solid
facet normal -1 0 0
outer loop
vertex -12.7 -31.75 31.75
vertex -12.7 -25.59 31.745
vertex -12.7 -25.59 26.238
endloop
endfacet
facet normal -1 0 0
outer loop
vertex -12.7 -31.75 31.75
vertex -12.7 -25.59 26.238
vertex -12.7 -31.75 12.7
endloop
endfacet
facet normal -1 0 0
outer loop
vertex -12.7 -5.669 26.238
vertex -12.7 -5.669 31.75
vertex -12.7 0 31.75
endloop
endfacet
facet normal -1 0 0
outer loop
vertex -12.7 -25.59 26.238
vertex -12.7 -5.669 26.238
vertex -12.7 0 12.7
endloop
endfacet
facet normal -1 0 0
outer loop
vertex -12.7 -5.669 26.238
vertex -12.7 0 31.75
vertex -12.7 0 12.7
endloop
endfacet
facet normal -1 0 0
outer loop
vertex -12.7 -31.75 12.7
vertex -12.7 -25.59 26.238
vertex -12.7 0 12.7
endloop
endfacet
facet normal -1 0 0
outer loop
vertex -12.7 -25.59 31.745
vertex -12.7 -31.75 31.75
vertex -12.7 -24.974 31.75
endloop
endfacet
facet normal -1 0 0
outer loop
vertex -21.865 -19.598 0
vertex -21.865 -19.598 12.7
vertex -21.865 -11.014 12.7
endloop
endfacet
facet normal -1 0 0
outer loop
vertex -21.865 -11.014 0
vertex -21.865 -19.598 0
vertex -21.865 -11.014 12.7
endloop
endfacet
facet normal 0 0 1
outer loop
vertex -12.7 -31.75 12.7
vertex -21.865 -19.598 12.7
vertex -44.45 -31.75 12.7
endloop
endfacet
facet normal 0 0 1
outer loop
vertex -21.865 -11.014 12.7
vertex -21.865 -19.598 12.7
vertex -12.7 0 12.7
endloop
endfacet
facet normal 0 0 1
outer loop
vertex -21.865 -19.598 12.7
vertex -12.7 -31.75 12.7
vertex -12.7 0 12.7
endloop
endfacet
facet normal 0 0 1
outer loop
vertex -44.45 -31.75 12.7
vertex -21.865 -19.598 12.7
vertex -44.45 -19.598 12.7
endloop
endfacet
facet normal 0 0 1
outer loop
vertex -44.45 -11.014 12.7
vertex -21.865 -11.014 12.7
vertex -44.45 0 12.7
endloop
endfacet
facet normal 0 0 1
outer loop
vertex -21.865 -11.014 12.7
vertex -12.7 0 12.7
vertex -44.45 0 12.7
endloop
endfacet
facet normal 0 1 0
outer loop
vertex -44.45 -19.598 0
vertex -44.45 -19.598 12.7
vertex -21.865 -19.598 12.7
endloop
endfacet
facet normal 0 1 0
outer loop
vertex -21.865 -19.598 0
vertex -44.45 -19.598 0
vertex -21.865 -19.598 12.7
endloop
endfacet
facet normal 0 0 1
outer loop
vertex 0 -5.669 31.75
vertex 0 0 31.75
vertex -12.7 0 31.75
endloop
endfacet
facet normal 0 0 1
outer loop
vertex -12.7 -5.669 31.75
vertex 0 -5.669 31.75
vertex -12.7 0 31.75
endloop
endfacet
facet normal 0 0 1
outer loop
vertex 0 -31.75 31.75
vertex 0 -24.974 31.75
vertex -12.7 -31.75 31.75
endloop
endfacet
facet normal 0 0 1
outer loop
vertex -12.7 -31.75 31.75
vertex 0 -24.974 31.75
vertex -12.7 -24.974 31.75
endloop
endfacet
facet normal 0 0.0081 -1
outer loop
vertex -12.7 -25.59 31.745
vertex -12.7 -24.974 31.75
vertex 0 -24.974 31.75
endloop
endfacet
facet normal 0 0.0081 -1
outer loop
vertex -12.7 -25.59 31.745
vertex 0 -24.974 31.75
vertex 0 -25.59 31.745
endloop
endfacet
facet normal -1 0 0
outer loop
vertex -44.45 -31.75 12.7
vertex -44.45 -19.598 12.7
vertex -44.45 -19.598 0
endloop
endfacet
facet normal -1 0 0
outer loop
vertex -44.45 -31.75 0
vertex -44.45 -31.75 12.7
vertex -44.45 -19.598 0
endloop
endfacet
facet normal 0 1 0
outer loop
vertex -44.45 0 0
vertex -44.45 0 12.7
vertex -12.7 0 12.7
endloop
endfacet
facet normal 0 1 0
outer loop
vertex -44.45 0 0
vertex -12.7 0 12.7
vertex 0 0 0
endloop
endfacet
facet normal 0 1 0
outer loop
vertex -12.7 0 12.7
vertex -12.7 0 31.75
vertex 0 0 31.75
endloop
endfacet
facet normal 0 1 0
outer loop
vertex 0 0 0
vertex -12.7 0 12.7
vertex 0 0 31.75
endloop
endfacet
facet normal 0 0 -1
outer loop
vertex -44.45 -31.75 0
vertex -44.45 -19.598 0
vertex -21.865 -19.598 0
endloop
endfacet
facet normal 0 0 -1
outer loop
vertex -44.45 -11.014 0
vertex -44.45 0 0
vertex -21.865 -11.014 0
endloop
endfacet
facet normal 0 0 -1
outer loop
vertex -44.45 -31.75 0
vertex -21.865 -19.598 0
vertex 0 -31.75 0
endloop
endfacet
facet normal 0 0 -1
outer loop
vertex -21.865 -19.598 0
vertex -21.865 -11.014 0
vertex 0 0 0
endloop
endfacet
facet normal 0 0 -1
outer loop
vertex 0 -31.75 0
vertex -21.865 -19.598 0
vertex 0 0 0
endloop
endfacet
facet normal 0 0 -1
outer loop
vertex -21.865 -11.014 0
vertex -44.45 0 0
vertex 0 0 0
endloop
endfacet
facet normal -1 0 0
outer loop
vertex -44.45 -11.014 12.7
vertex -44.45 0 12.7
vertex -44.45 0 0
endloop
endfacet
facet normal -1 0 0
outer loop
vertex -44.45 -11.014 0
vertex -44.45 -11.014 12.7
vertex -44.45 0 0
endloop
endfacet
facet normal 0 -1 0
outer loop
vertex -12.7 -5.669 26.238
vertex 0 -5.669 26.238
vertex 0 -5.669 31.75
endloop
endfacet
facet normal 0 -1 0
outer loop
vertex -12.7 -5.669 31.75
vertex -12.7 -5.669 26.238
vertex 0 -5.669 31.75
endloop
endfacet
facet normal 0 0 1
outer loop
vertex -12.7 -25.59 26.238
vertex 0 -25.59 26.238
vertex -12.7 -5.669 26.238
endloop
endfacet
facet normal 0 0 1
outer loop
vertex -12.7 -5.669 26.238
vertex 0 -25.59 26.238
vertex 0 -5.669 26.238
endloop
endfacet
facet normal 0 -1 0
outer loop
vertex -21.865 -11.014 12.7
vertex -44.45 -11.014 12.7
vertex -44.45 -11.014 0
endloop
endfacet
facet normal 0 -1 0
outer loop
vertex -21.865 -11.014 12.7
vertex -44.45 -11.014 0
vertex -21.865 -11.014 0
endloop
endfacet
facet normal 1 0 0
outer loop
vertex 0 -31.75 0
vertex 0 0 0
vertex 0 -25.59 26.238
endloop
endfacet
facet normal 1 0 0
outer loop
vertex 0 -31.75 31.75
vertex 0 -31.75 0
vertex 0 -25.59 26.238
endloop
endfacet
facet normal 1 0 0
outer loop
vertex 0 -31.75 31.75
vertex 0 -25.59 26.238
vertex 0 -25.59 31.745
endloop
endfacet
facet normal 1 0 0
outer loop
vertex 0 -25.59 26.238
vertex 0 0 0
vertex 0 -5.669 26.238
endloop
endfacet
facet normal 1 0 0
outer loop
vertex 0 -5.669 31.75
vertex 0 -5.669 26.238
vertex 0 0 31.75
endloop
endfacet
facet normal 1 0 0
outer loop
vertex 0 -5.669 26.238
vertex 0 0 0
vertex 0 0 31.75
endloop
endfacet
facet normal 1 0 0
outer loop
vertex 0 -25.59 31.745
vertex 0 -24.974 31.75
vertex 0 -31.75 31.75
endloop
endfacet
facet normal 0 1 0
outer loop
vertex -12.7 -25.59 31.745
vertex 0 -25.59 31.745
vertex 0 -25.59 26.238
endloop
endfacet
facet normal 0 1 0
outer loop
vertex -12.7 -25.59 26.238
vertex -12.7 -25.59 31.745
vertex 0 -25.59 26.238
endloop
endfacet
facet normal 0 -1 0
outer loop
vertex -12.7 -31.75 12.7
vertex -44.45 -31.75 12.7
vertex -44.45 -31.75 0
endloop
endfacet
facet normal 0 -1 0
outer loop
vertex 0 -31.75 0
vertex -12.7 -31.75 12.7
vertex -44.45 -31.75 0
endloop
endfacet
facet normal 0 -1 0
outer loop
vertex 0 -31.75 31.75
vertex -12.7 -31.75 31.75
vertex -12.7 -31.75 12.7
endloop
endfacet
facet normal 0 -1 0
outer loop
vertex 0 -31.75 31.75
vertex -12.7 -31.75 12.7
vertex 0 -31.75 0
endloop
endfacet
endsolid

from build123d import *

# Parameters (mm, degrees)
F1_DEPTH = 31.75
F2_W     = 22.5849208206
F2_H     = 8.5840681568
F3_DEPTH = 1320.8
F5_DEPTH = 127


with BuildPart() as f1:
    # F0 (on Front) → F1 (new body)
    with BuildSketch(Plane.XZ):
        Polygon((-44.45, 0), (0, 0), (0, 31.75), (-12.7, 31.75), (-12.7, 12.7), (-44.45, 12.7), align=None)
    extrude(amount=F1_DEPTH)

    # F2 (on face) → F3 (cut)
    with BuildSketch(Plane.XY.offset(12.7)):
        with Locations((-33.1575395897, -15.3055558912)):
            Rectangle(F2_W, F2_H)
    extrude(amount=-F3_DEPTH, mode=Mode.SUBTRACT)

    # F4 (on Right) → F5 (cut)
    with BuildSketch(Plane.YZ):
        Polygon((-5.6687253527, 31.9069586694), (-25.590242818, 31.7449867725), (-25.590242818, 26.2379515916), (-5.6687253527, 26.2379515916), align=None)
    extrude(amount=-F5_DEPTH, mode=Mode.SUBTRACT)


solid = f1.part
